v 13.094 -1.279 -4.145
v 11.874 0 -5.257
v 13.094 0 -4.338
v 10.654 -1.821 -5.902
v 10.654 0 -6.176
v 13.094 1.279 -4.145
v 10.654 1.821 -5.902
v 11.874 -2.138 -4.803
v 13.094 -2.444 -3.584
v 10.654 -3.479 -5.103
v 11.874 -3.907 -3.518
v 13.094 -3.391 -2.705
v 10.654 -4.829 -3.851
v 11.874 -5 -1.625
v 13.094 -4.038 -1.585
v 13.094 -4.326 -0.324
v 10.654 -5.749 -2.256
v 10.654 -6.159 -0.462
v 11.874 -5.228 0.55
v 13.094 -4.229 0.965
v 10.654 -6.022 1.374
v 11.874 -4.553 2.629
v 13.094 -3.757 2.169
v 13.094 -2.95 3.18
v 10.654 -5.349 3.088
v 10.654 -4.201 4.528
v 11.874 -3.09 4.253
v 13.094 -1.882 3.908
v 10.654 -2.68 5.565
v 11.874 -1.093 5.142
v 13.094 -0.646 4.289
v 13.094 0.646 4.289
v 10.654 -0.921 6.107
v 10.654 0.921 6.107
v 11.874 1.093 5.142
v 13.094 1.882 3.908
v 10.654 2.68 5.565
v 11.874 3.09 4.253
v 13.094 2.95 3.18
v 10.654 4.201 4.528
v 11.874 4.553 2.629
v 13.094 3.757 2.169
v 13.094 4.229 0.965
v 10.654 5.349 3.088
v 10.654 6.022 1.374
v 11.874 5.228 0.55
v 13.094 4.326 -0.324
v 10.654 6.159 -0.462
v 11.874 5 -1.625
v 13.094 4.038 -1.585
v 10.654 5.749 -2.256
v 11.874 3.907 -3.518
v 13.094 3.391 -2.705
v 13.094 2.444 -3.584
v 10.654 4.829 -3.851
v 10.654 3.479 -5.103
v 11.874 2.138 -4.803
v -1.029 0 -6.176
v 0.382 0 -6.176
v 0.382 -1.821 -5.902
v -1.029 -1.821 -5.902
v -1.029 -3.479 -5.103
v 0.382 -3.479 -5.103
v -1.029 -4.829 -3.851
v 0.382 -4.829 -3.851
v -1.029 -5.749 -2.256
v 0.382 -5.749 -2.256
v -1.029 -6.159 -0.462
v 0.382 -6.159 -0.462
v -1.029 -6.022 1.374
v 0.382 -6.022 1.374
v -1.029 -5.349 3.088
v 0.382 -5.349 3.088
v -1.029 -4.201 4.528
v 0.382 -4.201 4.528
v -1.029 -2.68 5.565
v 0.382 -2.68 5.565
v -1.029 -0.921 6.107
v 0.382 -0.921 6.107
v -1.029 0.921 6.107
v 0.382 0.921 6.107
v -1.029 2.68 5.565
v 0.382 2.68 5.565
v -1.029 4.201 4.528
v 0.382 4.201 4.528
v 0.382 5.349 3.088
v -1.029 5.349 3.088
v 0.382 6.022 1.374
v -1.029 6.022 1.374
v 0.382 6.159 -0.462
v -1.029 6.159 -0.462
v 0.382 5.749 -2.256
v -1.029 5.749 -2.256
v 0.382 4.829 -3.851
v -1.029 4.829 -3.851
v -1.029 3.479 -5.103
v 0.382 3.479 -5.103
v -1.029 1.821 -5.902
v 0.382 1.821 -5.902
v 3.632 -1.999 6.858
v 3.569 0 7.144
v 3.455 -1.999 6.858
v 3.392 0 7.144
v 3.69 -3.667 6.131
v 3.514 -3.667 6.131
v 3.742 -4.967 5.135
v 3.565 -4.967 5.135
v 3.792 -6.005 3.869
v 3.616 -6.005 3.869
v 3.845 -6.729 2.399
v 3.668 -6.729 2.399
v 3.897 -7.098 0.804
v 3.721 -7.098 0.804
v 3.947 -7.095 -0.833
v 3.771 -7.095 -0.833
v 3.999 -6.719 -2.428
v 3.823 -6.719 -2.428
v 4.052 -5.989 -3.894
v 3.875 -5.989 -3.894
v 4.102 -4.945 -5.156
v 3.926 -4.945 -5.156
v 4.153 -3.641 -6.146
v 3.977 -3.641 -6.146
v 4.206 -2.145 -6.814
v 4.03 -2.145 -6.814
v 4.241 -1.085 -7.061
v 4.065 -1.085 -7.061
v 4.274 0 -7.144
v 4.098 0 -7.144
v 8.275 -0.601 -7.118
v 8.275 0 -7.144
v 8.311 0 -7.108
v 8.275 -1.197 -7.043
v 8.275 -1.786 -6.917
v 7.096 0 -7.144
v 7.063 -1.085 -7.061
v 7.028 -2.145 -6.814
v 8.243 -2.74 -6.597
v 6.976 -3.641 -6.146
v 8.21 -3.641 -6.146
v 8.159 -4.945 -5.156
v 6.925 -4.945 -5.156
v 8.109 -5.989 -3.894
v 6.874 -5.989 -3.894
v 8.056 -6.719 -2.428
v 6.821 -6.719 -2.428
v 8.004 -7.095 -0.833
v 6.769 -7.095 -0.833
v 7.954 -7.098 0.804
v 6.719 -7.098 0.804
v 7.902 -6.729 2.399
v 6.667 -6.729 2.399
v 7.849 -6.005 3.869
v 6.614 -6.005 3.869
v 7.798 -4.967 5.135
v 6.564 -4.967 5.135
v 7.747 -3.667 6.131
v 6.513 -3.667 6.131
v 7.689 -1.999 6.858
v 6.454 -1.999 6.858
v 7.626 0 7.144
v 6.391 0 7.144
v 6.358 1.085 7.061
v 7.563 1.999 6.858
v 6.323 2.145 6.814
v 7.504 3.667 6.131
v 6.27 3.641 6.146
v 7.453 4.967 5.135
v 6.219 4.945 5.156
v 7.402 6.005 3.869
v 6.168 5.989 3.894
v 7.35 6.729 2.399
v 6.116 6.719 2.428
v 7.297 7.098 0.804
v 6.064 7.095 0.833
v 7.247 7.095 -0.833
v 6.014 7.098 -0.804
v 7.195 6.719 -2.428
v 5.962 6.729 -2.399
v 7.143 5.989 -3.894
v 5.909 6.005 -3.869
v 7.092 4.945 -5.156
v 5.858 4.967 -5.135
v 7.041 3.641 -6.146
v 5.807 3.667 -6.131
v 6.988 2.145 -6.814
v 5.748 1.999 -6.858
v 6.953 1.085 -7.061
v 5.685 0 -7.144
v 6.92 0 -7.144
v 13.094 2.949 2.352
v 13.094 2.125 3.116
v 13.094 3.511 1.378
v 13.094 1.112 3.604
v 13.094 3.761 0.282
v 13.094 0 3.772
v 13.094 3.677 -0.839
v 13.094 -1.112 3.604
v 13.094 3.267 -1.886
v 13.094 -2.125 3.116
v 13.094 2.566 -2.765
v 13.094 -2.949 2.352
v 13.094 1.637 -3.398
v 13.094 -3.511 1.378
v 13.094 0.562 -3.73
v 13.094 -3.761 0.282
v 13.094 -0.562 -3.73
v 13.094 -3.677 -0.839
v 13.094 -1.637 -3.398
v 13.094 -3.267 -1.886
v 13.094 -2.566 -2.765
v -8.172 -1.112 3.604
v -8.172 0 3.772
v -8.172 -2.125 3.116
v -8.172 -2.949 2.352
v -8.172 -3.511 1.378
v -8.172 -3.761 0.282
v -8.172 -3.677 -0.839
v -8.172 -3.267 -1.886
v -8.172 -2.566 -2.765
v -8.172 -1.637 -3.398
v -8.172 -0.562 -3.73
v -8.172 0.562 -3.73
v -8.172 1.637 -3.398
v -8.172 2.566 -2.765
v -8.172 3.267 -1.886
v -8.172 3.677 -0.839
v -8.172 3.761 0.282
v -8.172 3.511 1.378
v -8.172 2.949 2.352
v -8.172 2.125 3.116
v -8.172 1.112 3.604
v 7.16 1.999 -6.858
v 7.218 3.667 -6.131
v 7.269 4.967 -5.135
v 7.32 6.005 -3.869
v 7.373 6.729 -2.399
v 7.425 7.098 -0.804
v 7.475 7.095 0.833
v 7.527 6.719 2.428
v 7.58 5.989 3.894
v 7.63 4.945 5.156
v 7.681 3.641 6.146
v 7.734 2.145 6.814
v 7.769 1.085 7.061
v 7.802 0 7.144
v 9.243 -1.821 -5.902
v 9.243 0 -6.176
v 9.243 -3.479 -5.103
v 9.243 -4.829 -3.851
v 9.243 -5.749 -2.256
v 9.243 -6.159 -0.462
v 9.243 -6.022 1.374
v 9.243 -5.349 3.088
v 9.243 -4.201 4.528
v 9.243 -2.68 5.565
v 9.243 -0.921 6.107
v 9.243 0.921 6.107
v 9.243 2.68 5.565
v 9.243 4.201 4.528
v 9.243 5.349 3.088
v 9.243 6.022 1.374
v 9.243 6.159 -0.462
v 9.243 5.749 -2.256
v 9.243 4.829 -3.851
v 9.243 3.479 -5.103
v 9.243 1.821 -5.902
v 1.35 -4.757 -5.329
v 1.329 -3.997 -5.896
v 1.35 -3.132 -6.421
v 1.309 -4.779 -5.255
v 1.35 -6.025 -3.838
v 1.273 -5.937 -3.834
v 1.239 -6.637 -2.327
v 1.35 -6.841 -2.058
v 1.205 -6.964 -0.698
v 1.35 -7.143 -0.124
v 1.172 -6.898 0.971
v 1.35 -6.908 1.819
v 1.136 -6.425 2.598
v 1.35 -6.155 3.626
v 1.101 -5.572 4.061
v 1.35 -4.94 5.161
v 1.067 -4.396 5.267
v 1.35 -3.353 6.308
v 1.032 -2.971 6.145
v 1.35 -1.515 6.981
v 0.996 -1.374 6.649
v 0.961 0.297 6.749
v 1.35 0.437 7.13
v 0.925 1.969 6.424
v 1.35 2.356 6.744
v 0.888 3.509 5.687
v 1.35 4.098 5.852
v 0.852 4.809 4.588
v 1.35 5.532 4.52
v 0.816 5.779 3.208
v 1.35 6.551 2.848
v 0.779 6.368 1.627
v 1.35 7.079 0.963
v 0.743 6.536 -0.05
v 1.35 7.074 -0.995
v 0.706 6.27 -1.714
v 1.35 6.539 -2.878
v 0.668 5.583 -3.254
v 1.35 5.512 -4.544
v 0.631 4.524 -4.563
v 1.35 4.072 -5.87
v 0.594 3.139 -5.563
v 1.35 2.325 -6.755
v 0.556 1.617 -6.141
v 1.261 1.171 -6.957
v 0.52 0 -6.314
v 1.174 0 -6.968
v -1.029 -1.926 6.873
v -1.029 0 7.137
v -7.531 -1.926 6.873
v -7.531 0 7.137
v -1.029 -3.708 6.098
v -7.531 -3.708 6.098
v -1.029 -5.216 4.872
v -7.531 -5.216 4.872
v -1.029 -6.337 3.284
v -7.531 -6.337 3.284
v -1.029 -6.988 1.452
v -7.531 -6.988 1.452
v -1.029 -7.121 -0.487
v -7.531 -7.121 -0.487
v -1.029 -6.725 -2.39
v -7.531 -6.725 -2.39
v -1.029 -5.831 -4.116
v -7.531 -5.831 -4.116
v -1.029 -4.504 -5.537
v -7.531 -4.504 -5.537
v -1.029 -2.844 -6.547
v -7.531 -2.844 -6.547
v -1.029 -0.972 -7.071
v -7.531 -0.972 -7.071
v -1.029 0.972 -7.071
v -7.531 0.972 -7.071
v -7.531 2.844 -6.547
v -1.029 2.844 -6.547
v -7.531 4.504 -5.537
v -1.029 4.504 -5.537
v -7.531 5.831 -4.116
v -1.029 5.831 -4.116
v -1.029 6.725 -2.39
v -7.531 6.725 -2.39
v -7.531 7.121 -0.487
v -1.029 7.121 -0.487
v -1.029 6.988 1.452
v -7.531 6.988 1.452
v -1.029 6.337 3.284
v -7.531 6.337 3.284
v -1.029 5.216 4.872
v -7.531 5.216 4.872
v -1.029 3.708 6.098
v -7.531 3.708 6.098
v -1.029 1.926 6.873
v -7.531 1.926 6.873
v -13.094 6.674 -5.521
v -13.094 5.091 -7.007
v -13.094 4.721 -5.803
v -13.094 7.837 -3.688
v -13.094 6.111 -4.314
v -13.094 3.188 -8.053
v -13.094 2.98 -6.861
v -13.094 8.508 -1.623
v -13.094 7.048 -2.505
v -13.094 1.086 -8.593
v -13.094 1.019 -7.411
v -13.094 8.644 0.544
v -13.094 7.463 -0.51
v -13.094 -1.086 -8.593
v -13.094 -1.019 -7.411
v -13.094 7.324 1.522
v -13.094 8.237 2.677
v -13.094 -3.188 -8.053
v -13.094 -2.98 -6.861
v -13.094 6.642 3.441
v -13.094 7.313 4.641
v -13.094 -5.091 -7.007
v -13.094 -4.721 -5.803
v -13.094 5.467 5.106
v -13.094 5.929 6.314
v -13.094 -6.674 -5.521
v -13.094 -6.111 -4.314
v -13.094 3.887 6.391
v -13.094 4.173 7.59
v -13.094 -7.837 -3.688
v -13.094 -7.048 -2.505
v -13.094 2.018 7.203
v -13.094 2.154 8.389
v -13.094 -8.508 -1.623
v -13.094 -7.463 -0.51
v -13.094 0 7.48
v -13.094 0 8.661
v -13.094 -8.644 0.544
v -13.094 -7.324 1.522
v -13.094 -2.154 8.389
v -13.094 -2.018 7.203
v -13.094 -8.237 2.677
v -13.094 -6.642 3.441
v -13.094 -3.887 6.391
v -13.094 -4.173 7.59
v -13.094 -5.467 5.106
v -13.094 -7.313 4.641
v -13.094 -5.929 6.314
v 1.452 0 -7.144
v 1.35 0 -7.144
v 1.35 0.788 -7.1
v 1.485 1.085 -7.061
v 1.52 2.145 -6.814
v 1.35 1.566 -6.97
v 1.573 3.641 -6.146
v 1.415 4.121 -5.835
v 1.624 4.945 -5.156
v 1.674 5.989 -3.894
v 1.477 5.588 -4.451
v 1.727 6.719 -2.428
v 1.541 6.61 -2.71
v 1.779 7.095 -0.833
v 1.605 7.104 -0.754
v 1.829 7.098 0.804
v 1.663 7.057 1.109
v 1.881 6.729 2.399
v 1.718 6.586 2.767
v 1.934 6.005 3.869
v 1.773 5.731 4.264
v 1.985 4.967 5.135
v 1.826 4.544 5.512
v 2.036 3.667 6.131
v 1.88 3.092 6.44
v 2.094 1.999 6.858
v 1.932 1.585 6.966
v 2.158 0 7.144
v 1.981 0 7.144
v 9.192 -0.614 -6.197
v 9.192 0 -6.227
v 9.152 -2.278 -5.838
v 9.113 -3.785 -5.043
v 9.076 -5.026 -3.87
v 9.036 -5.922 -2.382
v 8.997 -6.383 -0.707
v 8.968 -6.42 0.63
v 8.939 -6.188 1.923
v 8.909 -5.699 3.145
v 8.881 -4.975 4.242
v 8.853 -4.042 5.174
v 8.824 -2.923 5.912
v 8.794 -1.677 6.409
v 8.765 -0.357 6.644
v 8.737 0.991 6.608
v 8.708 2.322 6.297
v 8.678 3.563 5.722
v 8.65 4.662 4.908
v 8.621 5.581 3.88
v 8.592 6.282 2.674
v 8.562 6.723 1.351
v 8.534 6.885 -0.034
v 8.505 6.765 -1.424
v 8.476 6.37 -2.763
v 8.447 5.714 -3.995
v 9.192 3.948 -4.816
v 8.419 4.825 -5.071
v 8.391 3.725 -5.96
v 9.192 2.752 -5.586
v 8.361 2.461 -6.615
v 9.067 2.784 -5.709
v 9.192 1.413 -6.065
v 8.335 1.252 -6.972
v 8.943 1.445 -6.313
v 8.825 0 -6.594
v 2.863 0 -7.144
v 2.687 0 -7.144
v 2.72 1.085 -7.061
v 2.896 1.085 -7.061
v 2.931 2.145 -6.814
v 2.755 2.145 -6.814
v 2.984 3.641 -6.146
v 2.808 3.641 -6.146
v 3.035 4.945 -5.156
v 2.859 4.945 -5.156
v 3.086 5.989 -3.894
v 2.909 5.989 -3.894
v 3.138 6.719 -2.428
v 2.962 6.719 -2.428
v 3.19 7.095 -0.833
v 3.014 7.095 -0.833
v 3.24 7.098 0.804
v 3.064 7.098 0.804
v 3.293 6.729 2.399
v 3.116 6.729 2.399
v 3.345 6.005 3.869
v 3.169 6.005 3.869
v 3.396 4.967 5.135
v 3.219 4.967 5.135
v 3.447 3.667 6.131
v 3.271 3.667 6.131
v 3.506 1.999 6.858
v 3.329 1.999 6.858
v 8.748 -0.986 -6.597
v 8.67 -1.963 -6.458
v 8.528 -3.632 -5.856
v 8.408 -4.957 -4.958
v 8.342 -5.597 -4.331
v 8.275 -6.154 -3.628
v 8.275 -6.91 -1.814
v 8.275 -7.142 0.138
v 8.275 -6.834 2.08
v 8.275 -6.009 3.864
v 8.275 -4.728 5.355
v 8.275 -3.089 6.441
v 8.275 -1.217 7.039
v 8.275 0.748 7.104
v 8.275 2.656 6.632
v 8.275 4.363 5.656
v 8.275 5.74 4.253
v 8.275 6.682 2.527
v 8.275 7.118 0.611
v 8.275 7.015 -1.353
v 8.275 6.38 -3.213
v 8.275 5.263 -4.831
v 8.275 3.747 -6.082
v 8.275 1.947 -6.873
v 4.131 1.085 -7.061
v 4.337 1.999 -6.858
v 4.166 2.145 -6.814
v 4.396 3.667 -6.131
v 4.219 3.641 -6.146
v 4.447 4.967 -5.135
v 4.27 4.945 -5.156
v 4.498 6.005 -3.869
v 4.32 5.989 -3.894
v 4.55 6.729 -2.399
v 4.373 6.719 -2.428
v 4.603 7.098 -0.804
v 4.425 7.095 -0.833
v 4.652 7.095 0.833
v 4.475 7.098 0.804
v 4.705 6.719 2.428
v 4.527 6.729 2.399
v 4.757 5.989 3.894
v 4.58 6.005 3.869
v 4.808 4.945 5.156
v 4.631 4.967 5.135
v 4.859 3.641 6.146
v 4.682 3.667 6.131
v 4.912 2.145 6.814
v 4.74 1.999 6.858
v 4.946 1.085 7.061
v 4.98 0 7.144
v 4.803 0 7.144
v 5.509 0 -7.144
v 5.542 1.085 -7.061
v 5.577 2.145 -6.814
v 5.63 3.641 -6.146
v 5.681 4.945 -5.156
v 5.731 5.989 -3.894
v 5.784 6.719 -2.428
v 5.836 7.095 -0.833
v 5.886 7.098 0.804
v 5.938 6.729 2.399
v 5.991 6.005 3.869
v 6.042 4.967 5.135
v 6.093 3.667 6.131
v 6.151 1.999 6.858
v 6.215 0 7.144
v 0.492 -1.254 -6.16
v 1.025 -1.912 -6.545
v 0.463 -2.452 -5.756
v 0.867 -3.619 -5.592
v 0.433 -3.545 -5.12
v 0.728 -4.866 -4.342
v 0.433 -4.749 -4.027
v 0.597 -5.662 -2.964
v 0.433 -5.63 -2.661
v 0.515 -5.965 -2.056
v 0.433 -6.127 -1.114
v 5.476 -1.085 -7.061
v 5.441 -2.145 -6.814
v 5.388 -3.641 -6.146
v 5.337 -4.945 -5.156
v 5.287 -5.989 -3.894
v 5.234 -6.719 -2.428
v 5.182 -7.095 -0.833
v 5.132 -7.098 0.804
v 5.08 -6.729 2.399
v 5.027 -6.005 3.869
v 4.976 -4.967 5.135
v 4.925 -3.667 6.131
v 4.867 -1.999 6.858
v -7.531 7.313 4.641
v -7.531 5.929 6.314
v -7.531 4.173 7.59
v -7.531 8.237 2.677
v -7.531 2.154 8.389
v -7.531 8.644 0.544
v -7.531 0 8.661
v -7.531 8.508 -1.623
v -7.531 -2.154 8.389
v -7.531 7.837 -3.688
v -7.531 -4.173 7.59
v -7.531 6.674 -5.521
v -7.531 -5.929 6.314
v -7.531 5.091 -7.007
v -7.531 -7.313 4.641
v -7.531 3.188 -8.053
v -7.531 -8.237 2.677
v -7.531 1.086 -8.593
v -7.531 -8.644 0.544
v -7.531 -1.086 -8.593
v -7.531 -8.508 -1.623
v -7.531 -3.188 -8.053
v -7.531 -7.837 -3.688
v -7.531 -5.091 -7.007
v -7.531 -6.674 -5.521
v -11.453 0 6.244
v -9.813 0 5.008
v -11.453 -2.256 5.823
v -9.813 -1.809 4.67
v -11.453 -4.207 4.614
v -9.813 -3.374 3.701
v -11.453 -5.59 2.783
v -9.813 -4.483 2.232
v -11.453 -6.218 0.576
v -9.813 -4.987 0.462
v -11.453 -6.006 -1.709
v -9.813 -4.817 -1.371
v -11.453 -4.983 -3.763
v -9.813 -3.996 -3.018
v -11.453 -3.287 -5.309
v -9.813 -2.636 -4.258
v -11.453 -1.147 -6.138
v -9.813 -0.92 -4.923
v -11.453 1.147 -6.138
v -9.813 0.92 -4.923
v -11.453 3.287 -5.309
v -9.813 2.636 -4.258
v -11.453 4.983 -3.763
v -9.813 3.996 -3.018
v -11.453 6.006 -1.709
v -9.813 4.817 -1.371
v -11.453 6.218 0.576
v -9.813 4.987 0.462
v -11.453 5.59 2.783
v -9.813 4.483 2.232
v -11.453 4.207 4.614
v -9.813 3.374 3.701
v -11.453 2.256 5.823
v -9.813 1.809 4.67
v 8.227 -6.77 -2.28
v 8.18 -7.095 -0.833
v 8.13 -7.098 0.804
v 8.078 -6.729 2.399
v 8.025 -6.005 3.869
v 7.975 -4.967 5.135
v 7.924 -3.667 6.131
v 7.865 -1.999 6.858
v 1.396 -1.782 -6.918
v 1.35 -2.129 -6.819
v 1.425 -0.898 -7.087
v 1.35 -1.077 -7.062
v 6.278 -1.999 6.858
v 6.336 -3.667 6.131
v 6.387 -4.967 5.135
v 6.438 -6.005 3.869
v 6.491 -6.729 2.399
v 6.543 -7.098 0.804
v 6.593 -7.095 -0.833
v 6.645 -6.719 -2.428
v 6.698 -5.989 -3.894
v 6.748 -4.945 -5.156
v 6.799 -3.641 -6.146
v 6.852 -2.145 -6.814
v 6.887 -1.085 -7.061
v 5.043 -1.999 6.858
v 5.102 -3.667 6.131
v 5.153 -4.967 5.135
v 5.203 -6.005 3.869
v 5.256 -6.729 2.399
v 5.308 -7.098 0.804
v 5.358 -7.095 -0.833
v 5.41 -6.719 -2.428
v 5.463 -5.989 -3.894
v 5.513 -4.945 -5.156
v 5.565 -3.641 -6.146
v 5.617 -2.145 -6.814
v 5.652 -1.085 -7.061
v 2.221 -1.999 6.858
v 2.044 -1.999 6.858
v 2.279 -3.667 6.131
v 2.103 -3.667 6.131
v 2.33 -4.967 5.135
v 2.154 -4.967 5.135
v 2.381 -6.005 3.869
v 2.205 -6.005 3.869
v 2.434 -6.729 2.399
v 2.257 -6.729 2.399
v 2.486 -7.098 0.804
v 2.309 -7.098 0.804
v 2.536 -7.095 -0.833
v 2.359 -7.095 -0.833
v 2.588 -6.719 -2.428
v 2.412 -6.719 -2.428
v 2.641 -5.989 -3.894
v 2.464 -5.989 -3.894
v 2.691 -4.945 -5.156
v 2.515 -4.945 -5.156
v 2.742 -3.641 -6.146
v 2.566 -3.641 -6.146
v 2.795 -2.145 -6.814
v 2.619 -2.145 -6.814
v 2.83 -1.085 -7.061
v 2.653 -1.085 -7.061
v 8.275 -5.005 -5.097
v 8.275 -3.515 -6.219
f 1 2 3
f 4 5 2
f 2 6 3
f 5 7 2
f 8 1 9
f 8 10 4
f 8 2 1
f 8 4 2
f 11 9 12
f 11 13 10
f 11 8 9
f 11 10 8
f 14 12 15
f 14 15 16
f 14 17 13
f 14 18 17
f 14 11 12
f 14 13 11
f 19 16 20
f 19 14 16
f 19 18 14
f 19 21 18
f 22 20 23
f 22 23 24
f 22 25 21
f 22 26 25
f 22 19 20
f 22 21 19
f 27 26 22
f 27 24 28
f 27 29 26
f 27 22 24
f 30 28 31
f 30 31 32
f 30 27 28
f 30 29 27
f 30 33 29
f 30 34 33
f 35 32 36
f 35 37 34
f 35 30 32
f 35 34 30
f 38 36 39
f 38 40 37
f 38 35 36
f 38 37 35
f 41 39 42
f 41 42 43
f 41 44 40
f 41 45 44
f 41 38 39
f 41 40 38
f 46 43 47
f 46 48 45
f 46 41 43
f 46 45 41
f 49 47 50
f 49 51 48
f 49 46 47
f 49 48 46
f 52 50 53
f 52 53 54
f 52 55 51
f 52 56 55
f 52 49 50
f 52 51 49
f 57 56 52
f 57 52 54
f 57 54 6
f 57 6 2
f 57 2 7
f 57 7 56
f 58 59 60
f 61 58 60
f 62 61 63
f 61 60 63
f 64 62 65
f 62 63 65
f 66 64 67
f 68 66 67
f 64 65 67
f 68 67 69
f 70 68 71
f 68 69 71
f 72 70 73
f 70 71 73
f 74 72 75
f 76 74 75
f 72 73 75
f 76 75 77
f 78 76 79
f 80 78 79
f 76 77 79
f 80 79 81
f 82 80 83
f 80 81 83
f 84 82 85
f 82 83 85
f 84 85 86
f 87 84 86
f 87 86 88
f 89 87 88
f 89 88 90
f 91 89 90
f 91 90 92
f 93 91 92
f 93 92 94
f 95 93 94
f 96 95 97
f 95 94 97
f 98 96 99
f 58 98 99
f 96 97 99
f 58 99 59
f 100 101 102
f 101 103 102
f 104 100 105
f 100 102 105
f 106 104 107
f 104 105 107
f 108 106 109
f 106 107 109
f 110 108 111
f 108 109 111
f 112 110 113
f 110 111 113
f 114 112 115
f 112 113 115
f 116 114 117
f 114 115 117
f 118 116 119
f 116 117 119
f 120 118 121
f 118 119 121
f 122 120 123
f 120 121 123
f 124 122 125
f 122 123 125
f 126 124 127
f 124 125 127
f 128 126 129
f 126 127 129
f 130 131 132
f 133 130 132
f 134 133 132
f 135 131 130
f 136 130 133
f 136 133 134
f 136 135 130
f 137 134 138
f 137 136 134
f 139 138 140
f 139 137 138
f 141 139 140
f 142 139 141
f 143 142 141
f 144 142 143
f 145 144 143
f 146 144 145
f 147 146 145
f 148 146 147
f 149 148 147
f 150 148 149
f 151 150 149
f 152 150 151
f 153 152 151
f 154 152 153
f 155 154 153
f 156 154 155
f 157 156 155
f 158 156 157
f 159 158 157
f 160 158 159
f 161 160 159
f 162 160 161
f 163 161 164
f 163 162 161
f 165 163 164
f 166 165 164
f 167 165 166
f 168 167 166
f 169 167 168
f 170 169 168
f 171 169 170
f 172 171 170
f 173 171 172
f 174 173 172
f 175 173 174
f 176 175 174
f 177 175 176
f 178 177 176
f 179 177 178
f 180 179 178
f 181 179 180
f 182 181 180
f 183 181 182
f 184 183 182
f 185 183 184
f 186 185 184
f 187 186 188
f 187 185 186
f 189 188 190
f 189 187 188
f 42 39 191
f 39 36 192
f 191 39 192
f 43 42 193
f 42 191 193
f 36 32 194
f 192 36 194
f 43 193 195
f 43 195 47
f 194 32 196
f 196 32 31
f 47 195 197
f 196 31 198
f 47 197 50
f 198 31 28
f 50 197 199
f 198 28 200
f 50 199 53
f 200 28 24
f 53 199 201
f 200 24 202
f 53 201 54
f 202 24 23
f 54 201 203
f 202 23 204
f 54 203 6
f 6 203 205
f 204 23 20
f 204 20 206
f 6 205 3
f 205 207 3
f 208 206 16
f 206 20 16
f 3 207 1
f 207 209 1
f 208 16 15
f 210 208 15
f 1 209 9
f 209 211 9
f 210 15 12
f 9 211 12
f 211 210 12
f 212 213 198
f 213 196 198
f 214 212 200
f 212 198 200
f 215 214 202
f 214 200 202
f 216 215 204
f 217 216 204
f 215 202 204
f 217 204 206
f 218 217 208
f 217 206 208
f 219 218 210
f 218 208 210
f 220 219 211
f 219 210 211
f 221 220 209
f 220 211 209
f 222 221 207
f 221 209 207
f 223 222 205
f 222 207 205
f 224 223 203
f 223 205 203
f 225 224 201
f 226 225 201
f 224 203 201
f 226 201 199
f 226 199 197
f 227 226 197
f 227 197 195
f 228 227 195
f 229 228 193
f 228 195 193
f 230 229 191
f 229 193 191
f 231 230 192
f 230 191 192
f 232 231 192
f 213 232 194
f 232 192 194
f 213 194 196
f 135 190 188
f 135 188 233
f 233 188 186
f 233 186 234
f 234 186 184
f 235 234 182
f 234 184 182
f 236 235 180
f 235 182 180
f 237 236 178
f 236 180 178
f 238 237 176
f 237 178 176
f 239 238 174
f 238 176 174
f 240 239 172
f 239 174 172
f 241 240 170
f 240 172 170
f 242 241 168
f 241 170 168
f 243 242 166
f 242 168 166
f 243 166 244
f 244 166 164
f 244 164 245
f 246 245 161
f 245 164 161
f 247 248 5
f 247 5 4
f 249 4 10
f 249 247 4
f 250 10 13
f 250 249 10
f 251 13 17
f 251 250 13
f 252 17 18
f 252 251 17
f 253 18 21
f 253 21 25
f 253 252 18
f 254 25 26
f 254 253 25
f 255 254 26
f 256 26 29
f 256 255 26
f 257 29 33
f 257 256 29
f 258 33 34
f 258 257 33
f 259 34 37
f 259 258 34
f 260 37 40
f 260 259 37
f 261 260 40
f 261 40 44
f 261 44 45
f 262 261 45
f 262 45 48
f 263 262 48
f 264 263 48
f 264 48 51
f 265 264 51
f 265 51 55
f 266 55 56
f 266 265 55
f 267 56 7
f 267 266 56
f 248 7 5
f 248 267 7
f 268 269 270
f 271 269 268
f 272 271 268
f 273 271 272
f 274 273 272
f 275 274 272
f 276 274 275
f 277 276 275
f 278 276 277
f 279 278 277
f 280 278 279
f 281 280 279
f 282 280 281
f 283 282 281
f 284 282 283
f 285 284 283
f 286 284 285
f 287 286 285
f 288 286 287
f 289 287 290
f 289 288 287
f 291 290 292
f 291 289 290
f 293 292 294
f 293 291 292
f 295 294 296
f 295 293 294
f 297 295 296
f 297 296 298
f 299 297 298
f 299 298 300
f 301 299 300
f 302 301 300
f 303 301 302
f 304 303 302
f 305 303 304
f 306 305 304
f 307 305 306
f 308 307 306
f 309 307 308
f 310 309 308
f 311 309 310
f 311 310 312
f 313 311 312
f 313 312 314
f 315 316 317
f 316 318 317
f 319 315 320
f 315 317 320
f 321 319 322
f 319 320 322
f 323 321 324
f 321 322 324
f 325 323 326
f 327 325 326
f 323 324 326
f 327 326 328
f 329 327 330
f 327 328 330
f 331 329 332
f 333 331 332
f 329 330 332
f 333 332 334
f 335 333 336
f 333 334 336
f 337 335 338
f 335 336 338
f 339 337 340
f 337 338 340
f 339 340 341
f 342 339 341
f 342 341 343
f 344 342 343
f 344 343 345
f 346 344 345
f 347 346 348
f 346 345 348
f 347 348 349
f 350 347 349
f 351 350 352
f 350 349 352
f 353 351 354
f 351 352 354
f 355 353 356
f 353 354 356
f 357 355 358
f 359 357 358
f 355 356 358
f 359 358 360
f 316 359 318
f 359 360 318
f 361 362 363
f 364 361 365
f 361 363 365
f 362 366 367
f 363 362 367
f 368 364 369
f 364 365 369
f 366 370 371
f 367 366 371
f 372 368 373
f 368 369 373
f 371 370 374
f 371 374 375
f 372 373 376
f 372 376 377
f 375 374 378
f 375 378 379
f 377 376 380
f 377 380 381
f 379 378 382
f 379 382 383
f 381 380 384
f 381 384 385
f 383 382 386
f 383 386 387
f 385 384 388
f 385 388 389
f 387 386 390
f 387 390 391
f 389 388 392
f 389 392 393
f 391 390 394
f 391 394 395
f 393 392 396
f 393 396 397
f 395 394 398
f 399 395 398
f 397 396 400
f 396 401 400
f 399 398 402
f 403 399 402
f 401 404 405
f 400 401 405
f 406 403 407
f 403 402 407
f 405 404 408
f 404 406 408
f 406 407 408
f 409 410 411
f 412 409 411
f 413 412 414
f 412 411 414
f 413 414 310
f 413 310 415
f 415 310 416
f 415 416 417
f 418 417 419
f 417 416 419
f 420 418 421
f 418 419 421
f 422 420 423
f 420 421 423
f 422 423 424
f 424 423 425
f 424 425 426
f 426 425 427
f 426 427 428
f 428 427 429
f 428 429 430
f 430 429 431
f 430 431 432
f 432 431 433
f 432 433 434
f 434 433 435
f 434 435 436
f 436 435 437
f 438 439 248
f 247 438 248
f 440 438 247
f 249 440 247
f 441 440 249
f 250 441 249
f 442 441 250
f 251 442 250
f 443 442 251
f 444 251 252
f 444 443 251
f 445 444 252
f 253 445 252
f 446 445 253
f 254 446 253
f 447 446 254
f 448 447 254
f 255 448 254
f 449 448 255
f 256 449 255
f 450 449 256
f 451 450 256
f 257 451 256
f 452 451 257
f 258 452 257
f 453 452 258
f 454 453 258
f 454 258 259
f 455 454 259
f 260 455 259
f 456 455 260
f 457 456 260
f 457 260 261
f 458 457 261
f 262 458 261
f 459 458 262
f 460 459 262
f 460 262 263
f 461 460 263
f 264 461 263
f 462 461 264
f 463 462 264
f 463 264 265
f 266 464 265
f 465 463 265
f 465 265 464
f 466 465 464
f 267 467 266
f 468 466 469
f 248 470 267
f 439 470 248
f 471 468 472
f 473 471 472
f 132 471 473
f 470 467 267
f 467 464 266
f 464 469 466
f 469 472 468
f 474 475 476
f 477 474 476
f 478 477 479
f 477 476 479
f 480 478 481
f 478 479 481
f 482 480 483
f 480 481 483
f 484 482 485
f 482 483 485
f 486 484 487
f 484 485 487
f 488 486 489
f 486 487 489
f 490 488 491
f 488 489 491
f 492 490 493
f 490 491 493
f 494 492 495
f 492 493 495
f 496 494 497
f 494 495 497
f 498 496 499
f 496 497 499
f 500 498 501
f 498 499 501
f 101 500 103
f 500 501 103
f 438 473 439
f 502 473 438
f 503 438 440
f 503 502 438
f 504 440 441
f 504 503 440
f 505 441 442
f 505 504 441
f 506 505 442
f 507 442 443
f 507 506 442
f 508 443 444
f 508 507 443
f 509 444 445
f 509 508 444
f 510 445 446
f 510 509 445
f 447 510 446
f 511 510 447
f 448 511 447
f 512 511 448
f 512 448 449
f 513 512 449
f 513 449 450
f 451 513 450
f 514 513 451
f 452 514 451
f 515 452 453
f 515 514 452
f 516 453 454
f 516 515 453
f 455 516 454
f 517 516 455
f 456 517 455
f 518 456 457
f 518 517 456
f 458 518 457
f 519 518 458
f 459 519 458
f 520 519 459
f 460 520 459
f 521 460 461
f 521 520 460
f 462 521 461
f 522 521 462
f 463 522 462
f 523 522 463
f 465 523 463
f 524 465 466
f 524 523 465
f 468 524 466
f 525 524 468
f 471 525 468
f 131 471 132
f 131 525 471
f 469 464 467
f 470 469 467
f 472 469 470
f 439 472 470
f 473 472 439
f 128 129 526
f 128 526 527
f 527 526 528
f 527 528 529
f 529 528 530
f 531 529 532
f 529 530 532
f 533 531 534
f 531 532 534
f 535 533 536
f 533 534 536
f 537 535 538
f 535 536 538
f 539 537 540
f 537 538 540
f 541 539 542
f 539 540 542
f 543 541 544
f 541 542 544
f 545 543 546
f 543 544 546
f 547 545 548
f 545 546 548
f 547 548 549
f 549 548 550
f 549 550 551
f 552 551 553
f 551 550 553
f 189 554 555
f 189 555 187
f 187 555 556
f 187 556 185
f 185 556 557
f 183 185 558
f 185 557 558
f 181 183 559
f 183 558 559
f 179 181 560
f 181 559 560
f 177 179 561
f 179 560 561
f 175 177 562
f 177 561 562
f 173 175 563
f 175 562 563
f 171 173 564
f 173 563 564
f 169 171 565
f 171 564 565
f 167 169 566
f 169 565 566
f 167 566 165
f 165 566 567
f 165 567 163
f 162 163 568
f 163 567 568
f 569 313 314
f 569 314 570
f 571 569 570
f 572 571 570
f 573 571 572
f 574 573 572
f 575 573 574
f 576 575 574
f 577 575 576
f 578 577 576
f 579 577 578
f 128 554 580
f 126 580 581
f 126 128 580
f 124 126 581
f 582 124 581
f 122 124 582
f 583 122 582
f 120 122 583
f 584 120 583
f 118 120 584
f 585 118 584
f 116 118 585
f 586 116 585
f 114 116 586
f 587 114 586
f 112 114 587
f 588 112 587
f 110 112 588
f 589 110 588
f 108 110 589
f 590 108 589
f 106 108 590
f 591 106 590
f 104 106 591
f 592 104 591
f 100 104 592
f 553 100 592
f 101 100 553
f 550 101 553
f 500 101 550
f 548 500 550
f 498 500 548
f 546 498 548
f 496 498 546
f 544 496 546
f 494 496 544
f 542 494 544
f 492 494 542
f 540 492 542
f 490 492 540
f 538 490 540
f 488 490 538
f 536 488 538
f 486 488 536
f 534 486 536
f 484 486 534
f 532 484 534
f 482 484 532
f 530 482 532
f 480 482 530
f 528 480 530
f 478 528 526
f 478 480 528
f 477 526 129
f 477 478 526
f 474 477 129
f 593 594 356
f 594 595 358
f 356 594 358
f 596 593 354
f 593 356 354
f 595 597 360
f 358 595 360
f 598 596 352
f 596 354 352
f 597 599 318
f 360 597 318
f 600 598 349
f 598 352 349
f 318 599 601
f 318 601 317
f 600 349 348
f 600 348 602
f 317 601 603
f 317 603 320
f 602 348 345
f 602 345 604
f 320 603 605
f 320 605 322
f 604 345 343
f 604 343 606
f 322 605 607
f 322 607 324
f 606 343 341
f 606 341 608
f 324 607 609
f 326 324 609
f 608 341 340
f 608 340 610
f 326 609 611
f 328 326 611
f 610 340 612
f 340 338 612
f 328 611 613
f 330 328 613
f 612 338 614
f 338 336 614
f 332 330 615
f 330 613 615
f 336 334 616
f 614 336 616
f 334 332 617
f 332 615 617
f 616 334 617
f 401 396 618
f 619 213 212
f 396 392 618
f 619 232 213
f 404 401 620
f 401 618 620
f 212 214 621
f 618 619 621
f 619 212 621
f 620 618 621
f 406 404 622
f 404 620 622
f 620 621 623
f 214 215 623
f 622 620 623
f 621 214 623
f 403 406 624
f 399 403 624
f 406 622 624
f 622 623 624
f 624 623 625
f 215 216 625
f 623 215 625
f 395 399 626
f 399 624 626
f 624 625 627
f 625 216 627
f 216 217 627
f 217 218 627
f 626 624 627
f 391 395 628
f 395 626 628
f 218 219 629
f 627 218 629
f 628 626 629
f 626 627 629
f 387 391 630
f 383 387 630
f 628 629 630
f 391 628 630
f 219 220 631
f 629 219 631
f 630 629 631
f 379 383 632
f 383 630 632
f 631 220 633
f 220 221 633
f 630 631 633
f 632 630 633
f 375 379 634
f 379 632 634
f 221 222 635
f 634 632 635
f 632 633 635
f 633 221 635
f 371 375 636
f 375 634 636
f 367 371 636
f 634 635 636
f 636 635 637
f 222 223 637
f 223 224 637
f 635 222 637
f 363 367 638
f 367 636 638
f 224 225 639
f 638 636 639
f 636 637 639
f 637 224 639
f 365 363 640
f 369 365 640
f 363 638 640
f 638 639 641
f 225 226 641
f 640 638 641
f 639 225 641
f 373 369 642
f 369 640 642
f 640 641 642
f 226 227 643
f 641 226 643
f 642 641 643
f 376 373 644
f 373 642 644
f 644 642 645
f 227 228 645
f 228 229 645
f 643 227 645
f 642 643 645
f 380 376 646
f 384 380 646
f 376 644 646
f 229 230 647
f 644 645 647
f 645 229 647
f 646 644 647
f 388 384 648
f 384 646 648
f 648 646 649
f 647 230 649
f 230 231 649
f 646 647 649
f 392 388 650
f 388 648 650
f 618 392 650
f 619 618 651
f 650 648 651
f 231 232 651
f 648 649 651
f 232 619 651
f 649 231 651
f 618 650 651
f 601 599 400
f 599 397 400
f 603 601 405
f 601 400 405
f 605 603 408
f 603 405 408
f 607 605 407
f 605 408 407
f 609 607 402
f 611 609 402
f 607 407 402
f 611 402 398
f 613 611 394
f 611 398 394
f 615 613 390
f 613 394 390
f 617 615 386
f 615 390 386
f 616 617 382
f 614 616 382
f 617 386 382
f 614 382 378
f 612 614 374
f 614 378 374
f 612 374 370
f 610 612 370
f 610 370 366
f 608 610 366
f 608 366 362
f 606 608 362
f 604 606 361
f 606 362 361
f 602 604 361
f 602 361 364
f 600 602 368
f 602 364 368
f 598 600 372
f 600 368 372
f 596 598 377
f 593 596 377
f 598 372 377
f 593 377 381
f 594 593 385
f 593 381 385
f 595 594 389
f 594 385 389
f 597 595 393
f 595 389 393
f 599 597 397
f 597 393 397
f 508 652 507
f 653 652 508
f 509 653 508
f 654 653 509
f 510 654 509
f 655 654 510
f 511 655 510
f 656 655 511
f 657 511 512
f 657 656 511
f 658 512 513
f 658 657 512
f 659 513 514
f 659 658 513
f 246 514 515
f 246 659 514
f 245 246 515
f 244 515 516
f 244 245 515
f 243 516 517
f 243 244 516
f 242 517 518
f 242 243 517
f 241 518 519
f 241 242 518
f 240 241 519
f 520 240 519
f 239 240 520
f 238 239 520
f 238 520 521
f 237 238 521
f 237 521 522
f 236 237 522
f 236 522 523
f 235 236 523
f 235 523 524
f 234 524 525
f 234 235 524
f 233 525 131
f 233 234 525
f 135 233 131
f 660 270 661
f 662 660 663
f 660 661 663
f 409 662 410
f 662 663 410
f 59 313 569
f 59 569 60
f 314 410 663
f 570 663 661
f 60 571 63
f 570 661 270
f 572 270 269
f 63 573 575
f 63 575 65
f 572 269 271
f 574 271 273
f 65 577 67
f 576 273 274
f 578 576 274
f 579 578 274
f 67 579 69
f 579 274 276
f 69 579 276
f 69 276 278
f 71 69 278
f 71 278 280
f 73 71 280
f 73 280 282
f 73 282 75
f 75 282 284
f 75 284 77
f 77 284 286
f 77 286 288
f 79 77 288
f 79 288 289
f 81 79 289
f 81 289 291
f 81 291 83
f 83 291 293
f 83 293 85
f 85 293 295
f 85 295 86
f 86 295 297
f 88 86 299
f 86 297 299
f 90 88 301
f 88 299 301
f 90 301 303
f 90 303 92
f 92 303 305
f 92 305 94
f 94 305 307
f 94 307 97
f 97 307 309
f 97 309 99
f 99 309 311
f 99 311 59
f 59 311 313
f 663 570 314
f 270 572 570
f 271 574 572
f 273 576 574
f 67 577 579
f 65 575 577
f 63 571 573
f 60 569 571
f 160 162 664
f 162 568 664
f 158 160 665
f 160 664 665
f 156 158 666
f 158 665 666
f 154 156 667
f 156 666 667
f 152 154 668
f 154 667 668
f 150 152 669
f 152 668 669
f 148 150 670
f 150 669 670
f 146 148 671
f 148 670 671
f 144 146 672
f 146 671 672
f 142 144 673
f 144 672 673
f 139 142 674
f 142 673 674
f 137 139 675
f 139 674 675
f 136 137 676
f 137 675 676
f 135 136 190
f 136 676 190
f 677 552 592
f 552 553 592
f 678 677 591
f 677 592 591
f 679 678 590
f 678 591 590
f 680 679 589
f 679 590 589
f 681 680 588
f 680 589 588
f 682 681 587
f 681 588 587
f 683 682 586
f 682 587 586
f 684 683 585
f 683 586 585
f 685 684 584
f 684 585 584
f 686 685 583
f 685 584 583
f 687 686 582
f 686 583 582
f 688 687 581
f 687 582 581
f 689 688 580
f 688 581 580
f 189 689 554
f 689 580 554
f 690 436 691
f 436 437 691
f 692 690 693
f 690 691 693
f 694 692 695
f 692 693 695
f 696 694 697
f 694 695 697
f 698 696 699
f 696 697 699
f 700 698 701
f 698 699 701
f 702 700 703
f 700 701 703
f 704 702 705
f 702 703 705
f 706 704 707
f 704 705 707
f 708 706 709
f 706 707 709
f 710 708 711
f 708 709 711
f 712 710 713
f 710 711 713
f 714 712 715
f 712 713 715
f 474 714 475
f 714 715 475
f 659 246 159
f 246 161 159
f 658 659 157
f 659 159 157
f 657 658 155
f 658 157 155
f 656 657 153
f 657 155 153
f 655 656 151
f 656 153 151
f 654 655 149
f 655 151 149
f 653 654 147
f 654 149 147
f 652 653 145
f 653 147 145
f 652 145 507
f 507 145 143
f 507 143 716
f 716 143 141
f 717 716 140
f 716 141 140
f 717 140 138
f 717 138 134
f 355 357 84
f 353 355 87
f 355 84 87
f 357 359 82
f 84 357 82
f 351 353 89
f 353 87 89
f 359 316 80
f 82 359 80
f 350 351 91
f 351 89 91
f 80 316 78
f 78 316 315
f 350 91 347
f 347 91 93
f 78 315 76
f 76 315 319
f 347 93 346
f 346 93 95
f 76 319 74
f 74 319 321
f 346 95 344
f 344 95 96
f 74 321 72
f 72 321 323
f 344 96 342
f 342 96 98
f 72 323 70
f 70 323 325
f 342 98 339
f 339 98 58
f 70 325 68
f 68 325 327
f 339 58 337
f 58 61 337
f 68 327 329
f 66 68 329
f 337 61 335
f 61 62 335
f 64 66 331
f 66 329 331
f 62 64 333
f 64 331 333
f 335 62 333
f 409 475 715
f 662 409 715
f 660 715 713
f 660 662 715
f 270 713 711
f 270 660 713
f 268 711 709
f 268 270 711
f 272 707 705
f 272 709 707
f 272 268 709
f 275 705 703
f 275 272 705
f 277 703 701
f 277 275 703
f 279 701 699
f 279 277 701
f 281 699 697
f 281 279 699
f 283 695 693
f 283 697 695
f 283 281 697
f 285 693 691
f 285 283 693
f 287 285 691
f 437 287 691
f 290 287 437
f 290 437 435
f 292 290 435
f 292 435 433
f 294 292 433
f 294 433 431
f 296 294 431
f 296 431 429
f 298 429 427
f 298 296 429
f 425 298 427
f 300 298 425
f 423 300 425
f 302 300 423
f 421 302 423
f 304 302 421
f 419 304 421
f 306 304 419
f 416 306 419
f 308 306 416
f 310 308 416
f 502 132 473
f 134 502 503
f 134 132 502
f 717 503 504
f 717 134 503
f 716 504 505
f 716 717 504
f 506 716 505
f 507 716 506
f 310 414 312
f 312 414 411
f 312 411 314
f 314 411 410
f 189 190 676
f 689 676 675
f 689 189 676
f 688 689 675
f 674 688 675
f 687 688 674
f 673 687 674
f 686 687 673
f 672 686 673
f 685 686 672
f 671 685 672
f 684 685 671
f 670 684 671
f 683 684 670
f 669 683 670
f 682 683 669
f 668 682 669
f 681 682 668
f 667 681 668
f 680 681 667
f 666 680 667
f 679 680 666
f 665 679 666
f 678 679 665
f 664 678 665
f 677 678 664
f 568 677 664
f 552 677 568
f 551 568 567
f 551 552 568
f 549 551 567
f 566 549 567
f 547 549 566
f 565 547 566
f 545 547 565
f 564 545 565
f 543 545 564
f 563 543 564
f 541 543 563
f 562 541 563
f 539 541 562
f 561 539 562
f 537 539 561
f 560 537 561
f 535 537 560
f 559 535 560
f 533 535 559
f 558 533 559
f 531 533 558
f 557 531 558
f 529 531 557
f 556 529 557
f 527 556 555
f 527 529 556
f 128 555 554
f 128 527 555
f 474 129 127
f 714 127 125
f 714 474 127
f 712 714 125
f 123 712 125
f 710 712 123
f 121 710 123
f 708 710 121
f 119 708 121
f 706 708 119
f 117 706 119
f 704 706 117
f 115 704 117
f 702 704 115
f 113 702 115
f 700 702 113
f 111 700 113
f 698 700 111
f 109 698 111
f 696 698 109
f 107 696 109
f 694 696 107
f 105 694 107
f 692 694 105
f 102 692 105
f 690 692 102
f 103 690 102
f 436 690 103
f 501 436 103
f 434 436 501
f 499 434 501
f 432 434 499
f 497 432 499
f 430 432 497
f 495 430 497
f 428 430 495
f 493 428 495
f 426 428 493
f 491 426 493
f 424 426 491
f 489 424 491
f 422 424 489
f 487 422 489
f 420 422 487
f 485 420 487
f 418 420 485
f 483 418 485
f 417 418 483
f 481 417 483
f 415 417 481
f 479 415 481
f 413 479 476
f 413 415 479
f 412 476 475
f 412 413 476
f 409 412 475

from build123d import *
from build123d.topology import SkipClean

# Parameters (mm, degrees)
CUT_SWEEP1_PITCH = 1.411111111


with BuildPart() as part:
    # Sketch1 → Revolve1 (revolve)
    with BuildSketch(Plane.XY, mode=Mode.PRIVATE) as revolve1_sk:
        Polygon((-13.0937, 8.6614), (-13.0937, 7.4803), (-8.172486984, 3.7719), (13.0937, 3.7719), (13.0937, 4.337685), (13.0937, 7.14375), (9.369925973, 7.14375), (-1.0287, 7.14375), (-1.0287, 7.1374), (-7.5311, 7.1374), (-7.5311, 8.6614), align=None)
    revolve(revolve1_sk.sketch.rotate(Axis((-13.0937, 0, 0), (1, 0, 0)), 90), axis=Axis((-13.0937, 0, 0), (1, 0, 0)))

    # Cut-Sweep1: the profile of Sketch4 profile screwed along a right-hand helix of 10.008 turns, 8 arcs to a turn; built about Z, then put on its axis
    cut_sweep1_z = Axis((0, 0, 0), (0, 0, 1))
    cut_sweep1_corners = [(7.14435, 0, 0.00034641), (7.14435, 0, -1.235068632), (6.227206448, 0, -0.705555556), (6.227206448, 0, -0.529166667)]
    with BuildLine(mode=Mode.PRIVATE) as cut_sweep1_profile:
        Line(cut_sweep1_corners[0], cut_sweep1_corners[1])
        Line(cut_sweep1_corners[1], cut_sweep1_corners[2])
        Line(cut_sweep1_corners[2], cut_sweep1_corners[3])
        Line(cut_sweep1_corners[3], cut_sweep1_corners[0])
    cut_sweep1_cap = Face(cut_sweep1_profile.wire())
    cut_sweep1_turn_angles = [0, 22.5, 45, 67.5, 90, 112.5, 135, 157.5, 180, 202.5, 225, 247.5, 270, 292.5, 315, 337.5, 360]
    cut_sweep1_turn_weights = [1, 0.9238795325112867, 1, 0.9238795325112867, 1, 0.9238795325112867, 1, 0.9238795325112867, 1, 0.9238795325112867, 1, 0.9238795325112867, 1, 0.9238795325112867, 1, 0.9238795325112867, 1]
    cut_sweep1_turn_rails = [Edge.make_bspline([Vector(p[0], p[1], 0).rotate(cut_sweep1_z, cut_sweep1_turn_angles[k]) / cut_sweep1_turn_weights[k] + Vector(0, 0, p[2] + CUT_SWEEP1_PITCH * cut_sweep1_turn_angles[k] / 360) for k in range(17)], [0, 0, 0, 1, 1, 2, 2, 3, 3, 4, 4, 5, 5, 6, 6, 7, 7, 8, 8, 8], 2, cut_sweep1_turn_weights) for p in cut_sweep1_corners]
    cut_sweep1_turn_sides = [Face.make_surface_from_curves(cut_sweep1_turn_rails[p[0]], cut_sweep1_turn_rails[p[1]]) for p in [(0, 1), (1, 2), (2, 3), (3, 0)]]
    cut_sweep1_last_angles = [3600, 3601.44, 3602.88]
    cut_sweep1_last_weights = [1, 0.9996841892832969, 1]
    cut_sweep1_last_rails = [Edge.make_bspline([Vector(p[0], p[1], 0).rotate(cut_sweep1_z, cut_sweep1_last_angles[k]) / cut_sweep1_last_weights[k] + Vector(0, 0, p[2] + CUT_SWEEP1_PITCH * cut_sweep1_last_angles[k] / 360) for k in range(3)], [0, 0, 0, 1, 1, 1], 2, cut_sweep1_last_weights) for p in cut_sweep1_corners]
    cut_sweep1_last_sides = [Face.make_surface_from_curves(cut_sweep1_last_rails[p[0]], cut_sweep1_last_rails[p[1]]) for p in [(0, 1), (1, 2), (2, 3), (3, 0)]]
    cut_sweep1 = Plane(origin=(13.0937, 0, 0), x_dir=(0, 1, 0), z_dir=(-1, 0, 0)) * Solid(Shell([*[p.moved(Location((0, 0, CUT_SWEEP1_PITCH * i))) for i in range(10) for p in cut_sweep1_turn_sides], *cut_sweep1_last_sides, cut_sweep1_cap, cut_sweep1_cap.rotate(cut_sweep1_z, 3602.88).moved(Location((0, 0, CUT_SWEEP1_PITCH * 3602.88 / 360)))]))
    add(cut_sweep1, mode=Mode.SUBTRACT)

    # Sketch5 → Cut-Revolve1 (revolve, cut)
    with BuildSketch(Plane.XY, mode=Mode.PRIVATE) as cut_revolve1_sk:
        Polygon((13.0937, 4.337685), (10.653634224, 6.176406448), (9.242523113, 6.176406448), (8.275179561, 7.14375), (13.0937, 7.14375), align=None)
        Polygon((-1.0287, 7.14375), (-1.0287, 6.176406448), (0.382411111, 6.176406448), (1.349754663, 7.14375), align=None)
    revolve(cut_revolve1_sk.sketch.rotate(Axis((0, 0, 0), (-1, 0, 0)), 90), axis=Axis((0, 0, 0), (-1, 0, 0)), mode=Mode.SUBTRACT)

    # Sketch6 → Revolve2 (revolve)
    with SkipClean():  # the faces are left unmerged after this step: merging them gives an invalid solid
        with BuildSketch(Plane.XY, mode=Mode.PRIVATE) as revolve2_sk:
            Polygon((1.349754663, 7.14375), (0.382411111, 6.176406448), (9.242523113, 6.176406448), (8.275179561, 7.14375), align=None)
        revolve(revolve2_sk.sketch.rotate(Axis((0, 0, 0), (-1, 0, 0)), 90), axis=Axis((0, 0, 0), (-1, 0, 0)))
    add(part.part.scale(1), mode=Mode.REPLACE)  # the faces are merged on a copy


solid = part.part
